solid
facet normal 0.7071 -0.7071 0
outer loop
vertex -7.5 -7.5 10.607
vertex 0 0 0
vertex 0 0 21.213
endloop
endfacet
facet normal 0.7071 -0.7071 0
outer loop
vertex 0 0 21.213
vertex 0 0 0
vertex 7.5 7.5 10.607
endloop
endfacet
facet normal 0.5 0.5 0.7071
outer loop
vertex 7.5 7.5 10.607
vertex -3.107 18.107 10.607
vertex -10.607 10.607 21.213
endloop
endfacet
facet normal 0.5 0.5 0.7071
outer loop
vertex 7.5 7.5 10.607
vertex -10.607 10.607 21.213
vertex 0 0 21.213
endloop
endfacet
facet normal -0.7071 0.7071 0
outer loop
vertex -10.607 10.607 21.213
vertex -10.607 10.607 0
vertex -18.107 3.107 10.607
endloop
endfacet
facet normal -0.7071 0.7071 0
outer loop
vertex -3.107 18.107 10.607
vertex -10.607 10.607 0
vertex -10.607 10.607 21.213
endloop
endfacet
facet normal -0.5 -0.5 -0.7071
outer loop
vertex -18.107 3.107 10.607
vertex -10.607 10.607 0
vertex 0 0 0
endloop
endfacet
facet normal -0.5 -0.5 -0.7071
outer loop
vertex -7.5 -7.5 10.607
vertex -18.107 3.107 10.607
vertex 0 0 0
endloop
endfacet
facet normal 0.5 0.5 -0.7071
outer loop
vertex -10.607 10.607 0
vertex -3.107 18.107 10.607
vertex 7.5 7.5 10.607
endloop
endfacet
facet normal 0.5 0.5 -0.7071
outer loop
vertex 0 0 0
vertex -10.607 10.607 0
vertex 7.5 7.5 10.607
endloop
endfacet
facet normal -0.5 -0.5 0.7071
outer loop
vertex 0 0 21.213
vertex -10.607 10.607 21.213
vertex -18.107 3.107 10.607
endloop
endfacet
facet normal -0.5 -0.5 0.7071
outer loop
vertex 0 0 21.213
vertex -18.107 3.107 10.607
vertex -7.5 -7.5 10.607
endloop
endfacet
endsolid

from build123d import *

# Parameters (mm, degrees)
F0_W     = 15
F0_H     = 15
F1_DEPTH = 15
F4_ANGLE = 45
F5_ANGLE = 45


with BuildPart() as f1:
    # F0 (on Front) → F1 (new body)
    with BuildSketch(Plane.XZ):
        with Locations((-7.5, 7.5)):
            Rectangle(F0_W, F0_H)
    extrude(amount=F1_DEPTH)


with BuildPart() as f1_1:
    # F4: moved
    add(f1.part.rotate(Axis((-5.703268, 0, 0), (-1, 0, 0)), F4_ANGLE))


with BuildPart() as f1_2:
    # F5: moved
    add(f1_1.part.rotate(Axis((0, 0, 2.941495), (0, 0, -1)), F5_ANGLE))


solid = f1_2.part
